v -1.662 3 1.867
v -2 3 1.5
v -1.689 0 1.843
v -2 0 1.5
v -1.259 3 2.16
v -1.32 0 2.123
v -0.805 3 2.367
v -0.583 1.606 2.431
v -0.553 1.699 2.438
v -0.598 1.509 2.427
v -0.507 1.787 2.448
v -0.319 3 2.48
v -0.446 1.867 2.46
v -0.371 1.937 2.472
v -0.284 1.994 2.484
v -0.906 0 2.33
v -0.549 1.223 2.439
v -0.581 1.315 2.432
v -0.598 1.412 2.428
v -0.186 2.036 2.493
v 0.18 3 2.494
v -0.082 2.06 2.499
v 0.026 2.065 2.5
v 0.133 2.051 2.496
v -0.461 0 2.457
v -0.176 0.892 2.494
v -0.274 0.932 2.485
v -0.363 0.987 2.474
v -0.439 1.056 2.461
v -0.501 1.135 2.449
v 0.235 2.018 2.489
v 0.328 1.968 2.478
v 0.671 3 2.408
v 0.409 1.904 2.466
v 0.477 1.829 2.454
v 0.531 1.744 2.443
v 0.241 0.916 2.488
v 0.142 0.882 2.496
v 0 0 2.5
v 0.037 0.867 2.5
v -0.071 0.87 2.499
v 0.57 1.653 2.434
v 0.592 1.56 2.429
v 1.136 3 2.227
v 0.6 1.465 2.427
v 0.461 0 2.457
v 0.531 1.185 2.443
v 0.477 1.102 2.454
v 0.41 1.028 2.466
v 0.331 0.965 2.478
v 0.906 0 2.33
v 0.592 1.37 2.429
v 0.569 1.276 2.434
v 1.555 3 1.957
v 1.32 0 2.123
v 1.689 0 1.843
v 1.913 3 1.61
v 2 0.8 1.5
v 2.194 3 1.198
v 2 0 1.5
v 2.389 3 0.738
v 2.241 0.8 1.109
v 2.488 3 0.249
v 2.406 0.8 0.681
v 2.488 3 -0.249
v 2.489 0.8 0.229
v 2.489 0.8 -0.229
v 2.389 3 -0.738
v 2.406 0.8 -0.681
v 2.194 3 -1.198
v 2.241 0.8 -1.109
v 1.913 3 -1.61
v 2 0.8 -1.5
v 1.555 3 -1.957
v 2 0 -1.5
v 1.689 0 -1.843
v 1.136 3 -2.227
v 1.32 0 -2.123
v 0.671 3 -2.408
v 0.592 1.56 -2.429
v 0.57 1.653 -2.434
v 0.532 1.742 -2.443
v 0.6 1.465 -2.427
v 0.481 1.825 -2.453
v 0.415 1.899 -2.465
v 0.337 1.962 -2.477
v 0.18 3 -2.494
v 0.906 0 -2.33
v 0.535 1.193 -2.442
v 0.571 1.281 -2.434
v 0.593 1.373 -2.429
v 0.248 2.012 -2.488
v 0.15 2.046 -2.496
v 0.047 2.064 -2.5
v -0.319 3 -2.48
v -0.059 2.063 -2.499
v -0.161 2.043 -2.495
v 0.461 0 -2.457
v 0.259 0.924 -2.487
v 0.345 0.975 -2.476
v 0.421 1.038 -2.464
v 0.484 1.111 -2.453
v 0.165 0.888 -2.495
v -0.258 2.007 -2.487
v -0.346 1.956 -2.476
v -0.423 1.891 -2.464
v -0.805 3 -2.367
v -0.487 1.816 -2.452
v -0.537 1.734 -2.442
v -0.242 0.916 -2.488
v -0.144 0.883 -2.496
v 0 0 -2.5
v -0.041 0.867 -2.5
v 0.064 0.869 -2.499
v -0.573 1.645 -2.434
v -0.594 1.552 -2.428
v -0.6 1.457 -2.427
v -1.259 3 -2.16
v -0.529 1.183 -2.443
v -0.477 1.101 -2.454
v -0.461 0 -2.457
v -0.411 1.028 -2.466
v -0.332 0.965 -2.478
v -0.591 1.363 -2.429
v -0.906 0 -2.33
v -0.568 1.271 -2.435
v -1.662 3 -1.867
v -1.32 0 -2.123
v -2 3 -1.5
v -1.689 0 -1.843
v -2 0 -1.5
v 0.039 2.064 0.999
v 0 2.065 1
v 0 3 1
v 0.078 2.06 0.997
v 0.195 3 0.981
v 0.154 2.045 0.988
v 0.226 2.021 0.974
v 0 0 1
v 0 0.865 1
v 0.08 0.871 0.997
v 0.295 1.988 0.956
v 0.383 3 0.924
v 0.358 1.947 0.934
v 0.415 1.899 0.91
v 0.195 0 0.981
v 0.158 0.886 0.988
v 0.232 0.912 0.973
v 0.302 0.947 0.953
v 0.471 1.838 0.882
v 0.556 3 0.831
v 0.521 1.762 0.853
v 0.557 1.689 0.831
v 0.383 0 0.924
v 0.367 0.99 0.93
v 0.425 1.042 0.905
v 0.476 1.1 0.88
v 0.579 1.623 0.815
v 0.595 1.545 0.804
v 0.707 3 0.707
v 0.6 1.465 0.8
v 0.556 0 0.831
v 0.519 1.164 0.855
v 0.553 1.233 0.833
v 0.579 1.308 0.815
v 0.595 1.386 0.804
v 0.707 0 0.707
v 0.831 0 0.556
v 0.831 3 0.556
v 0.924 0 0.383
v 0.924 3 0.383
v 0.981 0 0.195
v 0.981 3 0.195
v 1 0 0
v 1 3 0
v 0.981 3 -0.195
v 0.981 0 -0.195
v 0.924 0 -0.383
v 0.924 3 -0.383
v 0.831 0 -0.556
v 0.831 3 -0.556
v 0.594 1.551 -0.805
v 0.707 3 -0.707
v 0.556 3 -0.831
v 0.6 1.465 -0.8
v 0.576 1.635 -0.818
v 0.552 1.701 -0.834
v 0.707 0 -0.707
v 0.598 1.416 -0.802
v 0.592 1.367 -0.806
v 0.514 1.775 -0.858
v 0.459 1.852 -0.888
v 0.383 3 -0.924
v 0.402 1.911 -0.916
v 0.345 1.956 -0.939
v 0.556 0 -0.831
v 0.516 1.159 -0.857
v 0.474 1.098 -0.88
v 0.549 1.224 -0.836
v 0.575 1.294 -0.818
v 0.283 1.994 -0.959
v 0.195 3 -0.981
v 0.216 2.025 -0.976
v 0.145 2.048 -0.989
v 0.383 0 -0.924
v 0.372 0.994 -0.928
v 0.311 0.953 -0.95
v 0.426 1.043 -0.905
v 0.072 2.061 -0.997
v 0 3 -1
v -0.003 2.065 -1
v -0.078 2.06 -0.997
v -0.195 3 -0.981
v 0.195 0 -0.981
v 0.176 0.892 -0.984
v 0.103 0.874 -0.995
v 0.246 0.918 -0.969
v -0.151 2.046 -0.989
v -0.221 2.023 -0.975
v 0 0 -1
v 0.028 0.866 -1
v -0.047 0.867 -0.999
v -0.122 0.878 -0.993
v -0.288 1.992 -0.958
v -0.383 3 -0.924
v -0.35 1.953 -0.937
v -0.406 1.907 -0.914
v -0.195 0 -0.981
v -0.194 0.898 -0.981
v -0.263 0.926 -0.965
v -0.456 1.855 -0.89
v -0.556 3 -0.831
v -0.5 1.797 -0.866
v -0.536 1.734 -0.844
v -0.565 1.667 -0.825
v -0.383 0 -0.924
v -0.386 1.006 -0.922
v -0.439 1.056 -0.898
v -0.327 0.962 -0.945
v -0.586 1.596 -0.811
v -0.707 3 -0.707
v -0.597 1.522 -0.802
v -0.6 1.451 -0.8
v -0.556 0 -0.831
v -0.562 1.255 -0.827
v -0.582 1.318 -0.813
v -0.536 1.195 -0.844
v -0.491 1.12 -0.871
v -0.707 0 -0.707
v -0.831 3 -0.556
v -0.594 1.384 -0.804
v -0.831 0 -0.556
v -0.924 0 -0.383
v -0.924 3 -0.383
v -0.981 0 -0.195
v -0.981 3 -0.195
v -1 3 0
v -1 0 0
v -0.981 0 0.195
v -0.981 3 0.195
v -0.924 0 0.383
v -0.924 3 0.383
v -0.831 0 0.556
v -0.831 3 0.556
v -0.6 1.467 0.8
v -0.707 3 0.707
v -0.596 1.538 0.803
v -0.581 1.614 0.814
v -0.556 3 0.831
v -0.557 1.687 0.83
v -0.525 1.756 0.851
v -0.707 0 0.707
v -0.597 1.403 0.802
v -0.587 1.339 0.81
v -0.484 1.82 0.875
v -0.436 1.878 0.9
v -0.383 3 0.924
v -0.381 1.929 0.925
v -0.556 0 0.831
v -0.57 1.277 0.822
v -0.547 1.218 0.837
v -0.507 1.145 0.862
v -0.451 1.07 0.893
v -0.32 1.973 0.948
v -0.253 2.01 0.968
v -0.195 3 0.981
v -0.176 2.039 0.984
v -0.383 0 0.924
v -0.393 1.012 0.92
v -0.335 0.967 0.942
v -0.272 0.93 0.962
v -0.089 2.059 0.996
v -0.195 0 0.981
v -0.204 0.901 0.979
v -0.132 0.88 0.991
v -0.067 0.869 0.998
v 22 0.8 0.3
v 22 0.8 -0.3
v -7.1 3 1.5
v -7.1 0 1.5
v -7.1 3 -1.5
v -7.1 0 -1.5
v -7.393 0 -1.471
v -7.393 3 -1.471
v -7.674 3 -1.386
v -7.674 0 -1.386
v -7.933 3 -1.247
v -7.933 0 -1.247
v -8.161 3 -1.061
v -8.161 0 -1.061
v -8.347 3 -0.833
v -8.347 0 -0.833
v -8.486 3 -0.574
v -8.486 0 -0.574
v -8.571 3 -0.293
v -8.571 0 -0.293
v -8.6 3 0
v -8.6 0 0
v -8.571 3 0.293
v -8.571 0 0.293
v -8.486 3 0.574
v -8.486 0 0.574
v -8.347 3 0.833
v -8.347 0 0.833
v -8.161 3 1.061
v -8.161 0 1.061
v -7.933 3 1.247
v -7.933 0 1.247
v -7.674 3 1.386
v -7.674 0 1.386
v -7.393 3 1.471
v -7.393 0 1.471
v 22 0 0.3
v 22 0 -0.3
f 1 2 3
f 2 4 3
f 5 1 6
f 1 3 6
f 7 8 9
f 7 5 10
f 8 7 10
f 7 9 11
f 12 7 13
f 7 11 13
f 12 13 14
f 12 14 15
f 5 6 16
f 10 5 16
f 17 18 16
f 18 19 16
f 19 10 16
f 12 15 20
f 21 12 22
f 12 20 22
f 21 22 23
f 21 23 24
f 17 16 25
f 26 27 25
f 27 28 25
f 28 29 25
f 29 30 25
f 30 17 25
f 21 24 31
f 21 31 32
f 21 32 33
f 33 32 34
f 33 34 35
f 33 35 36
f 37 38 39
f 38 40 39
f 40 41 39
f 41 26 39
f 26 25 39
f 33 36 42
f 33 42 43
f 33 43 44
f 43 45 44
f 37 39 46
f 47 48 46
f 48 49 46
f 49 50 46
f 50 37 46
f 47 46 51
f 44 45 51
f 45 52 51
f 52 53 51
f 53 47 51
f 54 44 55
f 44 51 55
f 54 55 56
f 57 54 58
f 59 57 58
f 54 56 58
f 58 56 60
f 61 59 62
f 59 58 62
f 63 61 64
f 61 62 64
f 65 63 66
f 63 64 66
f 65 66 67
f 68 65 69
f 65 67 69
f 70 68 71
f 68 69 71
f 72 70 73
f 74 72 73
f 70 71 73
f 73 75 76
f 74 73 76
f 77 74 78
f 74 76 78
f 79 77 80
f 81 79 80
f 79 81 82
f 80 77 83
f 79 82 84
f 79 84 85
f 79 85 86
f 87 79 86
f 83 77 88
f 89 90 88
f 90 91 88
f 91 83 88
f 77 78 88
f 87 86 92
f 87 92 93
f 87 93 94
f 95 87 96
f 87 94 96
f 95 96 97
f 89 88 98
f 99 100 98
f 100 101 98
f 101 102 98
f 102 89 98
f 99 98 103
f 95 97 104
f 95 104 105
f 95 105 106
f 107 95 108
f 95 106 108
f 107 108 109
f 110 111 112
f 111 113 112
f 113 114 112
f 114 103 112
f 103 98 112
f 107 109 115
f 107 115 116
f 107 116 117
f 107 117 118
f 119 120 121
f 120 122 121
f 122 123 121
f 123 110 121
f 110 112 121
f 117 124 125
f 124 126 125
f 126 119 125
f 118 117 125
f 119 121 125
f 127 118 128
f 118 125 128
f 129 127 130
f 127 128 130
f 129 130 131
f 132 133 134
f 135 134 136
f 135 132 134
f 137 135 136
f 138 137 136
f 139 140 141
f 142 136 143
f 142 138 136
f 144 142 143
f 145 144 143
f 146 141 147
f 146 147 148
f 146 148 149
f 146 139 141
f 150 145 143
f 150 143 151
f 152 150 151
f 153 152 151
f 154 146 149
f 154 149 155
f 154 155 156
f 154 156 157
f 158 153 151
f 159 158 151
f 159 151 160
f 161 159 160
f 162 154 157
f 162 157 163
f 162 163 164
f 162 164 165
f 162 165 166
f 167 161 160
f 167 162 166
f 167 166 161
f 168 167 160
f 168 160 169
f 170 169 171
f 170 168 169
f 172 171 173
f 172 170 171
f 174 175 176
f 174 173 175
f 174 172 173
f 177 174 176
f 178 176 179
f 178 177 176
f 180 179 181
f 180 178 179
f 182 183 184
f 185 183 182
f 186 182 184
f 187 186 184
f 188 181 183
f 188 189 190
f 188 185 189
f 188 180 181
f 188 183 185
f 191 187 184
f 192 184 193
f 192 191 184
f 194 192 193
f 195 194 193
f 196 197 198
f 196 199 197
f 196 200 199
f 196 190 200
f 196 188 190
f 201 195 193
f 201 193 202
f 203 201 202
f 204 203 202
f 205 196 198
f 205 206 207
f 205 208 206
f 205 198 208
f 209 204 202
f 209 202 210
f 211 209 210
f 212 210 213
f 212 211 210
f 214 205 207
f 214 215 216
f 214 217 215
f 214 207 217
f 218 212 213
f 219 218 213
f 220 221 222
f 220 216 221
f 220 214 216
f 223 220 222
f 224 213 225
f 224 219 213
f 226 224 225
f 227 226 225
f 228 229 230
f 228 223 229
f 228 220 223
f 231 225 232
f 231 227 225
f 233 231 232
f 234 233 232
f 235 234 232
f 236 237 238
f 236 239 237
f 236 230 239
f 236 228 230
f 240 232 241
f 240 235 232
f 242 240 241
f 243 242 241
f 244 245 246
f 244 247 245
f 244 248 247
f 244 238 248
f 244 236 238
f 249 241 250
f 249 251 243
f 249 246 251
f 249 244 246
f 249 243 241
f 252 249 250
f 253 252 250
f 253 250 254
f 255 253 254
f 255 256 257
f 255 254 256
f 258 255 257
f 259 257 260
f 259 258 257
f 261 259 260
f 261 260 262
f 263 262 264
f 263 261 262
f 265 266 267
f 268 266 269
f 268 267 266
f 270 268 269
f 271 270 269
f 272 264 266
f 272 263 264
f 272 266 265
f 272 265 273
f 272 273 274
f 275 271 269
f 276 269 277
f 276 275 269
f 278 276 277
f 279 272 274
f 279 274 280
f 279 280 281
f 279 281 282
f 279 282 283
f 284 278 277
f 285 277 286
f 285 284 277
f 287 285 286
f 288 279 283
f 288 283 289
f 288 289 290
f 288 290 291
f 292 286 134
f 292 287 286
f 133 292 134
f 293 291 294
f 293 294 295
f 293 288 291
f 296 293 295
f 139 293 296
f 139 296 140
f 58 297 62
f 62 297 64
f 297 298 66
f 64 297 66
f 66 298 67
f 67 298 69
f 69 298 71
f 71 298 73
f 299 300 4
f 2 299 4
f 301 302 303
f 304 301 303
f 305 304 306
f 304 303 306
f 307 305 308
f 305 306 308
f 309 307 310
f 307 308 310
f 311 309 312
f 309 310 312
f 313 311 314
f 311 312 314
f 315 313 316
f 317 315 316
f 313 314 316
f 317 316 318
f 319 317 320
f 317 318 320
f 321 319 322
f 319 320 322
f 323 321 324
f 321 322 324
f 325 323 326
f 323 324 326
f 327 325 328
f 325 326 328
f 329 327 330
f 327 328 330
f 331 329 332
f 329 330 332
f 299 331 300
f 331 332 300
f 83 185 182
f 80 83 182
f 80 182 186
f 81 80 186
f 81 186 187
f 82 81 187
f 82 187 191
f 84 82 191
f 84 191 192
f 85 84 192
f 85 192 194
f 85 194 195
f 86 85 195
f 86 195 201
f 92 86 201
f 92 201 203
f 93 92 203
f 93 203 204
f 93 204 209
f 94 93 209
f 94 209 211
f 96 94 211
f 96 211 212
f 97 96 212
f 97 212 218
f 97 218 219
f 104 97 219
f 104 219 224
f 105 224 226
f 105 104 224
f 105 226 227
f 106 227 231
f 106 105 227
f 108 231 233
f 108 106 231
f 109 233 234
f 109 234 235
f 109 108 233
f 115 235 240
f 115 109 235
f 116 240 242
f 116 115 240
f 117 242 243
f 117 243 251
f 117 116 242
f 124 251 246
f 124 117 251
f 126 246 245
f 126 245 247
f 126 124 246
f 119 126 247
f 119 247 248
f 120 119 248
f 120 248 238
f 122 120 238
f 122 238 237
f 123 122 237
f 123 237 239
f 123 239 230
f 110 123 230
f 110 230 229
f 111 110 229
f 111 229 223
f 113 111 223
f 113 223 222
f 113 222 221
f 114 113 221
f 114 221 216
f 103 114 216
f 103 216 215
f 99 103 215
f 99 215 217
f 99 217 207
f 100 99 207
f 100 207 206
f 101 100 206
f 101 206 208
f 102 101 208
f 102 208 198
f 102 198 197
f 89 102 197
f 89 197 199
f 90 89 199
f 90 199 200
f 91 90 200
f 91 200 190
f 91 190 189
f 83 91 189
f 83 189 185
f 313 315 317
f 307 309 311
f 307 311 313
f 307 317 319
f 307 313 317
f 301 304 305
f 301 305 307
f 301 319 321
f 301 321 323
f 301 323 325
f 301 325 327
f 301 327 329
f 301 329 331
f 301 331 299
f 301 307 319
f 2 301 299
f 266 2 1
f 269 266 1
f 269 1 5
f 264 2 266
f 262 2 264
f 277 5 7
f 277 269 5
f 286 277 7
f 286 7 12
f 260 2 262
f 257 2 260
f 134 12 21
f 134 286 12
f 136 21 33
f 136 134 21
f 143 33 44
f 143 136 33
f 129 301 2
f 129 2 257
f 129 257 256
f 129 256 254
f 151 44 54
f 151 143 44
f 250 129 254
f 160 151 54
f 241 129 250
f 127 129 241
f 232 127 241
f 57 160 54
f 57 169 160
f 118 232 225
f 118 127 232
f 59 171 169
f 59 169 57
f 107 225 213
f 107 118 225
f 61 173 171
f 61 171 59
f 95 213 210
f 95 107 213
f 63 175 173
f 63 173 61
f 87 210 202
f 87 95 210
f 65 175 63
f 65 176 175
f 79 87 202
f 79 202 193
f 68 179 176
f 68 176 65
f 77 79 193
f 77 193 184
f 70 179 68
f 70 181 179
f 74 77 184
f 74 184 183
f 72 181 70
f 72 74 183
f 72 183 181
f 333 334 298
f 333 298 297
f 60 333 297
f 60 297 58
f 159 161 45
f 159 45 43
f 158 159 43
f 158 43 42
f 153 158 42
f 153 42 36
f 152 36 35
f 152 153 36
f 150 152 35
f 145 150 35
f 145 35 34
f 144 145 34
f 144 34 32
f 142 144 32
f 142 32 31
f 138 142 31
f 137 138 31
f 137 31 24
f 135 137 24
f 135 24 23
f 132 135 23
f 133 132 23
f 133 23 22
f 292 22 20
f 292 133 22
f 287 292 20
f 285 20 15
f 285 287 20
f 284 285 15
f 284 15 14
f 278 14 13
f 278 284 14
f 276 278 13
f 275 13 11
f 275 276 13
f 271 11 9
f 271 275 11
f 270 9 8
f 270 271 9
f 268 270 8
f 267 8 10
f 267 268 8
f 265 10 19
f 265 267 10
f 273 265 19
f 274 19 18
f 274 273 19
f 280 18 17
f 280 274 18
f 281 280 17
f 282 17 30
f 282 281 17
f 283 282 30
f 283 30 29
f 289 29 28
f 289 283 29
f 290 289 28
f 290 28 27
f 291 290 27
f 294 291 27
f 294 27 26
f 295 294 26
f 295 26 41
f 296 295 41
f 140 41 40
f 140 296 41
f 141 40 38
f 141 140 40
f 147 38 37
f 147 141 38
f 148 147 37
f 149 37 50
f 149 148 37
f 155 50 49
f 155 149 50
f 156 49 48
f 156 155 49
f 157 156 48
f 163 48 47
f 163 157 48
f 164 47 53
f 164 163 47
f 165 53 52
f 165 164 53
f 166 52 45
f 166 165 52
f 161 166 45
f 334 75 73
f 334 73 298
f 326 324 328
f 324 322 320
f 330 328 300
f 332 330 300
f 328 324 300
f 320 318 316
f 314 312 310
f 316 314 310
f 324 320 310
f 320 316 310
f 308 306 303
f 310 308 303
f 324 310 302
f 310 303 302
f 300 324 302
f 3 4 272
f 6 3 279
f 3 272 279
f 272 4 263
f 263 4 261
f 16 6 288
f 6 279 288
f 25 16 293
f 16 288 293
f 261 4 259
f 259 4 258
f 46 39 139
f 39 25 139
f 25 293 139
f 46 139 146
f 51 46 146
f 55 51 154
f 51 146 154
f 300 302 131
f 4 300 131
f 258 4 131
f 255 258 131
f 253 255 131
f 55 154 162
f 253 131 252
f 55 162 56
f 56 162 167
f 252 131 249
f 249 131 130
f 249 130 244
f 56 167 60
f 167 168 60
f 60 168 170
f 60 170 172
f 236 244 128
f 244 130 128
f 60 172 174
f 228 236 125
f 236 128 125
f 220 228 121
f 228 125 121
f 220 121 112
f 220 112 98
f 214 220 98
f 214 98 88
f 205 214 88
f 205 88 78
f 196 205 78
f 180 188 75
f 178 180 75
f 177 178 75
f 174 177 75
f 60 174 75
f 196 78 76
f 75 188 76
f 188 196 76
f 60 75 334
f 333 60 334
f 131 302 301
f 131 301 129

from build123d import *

# Parameters (mm, degrees)
HUB_SKETCH_R              = 2.5
HUB_DEPTH                 = 3
POINTER_DEPTH             = 0.8
TAIL_SKETCH_W             = 7.1
TAIL_SKETCH_H             = 3
TAIL_DEPTH                = 3
TAIL_END_SKETCH_R         = 1.5
TAIL_END_DEPTH            = 3
SHAFT_BORE_DEPTH          = 23.343902972
SHAFT_BORE_DEPTH_BACK     = 23.343902972
BORE_SKETCH_R             = 1
SET_SCREW_HOLE_DEPTH      = 23.343902972
SET_SCREW_HOLE_DEPTH_BACK = 23.343902972
SETSCREW_SKETCH_R         = 0.6


with BuildPart() as part:
    # HUB_SKETCH → HUB (new body)
    with BuildSketch(Plane(origin=(0, 0, 0), x_dir=(1, 0, 0), z_dir=(0, 1, 0))):
        Circle(HUB_SKETCH_R)
    extrude(amount=HUB_DEPTH)

    # POINTER_SKETCH → POINTER (add)
    with BuildSketch(Plane(origin=(0, 0, 0), x_dir=(1, 0, 0), z_dir=(0, 1, 0))):
        Polygon((2, 1.5), (22, 0.3), (22, -0.3), (2, -1.5), align=None)
    extrude(amount=POINTER_DEPTH)

    # TAIL_SKETCH → TAIL (add)
    with BuildSketch(Plane(origin=(0, 0, 0), x_dir=(1, 0, 0), z_dir=(0, 1, 0))):
        with Locations((-3.55, 0)):
            Rectangle(TAIL_SKETCH_W, TAIL_SKETCH_H)
    extrude(amount=TAIL_DEPTH)

    # TAIL_END_SKETCH → TAIL_END (add)
    with BuildSketch(Plane(origin=(0, 0, 0), x_dir=(1, 0, 0), z_dir=(0, 1, 0))):
        with Locations((-7.1, 0)):
            Circle(TAIL_END_SKETCH_R)
    extrude(amount=TAIL_END_DEPTH)

    # BORE_SKETCH → SHAFT_BORE (cut, two sides: drawn at the far end of the back side and taken through both)
    with BuildSketch(Plane(origin=(0, 0, 0), x_dir=(1, 0, 0), z_dir=(0, 1, 0)).offset(-SHAFT_BORE_DEPTH_BACK)):
        Circle(BORE_SKETCH_R)
    extrude(amount=SHAFT_BORE_DEPTH + SHAFT_BORE_DEPTH_BACK, mode=Mode.SUBTRACT)

    # SETSCREW_SKETCH → SET_SCREW_HOLE (cut, two sides: drawn at the far end of the back side and taken through both)
    with BuildSketch(Plane.XY.offset(-SET_SCREW_HOLE_DEPTH_BACK)):
        with Locations((0, 1.46538664)):
            Circle(SETSCREW_SKETCH_R)
    extrude(amount=SET_SCREW_HOLE_DEPTH + SET_SCREW_HOLE_DEPTH_BACK, mode=Mode.SUBTRACT)


solid = part.part
